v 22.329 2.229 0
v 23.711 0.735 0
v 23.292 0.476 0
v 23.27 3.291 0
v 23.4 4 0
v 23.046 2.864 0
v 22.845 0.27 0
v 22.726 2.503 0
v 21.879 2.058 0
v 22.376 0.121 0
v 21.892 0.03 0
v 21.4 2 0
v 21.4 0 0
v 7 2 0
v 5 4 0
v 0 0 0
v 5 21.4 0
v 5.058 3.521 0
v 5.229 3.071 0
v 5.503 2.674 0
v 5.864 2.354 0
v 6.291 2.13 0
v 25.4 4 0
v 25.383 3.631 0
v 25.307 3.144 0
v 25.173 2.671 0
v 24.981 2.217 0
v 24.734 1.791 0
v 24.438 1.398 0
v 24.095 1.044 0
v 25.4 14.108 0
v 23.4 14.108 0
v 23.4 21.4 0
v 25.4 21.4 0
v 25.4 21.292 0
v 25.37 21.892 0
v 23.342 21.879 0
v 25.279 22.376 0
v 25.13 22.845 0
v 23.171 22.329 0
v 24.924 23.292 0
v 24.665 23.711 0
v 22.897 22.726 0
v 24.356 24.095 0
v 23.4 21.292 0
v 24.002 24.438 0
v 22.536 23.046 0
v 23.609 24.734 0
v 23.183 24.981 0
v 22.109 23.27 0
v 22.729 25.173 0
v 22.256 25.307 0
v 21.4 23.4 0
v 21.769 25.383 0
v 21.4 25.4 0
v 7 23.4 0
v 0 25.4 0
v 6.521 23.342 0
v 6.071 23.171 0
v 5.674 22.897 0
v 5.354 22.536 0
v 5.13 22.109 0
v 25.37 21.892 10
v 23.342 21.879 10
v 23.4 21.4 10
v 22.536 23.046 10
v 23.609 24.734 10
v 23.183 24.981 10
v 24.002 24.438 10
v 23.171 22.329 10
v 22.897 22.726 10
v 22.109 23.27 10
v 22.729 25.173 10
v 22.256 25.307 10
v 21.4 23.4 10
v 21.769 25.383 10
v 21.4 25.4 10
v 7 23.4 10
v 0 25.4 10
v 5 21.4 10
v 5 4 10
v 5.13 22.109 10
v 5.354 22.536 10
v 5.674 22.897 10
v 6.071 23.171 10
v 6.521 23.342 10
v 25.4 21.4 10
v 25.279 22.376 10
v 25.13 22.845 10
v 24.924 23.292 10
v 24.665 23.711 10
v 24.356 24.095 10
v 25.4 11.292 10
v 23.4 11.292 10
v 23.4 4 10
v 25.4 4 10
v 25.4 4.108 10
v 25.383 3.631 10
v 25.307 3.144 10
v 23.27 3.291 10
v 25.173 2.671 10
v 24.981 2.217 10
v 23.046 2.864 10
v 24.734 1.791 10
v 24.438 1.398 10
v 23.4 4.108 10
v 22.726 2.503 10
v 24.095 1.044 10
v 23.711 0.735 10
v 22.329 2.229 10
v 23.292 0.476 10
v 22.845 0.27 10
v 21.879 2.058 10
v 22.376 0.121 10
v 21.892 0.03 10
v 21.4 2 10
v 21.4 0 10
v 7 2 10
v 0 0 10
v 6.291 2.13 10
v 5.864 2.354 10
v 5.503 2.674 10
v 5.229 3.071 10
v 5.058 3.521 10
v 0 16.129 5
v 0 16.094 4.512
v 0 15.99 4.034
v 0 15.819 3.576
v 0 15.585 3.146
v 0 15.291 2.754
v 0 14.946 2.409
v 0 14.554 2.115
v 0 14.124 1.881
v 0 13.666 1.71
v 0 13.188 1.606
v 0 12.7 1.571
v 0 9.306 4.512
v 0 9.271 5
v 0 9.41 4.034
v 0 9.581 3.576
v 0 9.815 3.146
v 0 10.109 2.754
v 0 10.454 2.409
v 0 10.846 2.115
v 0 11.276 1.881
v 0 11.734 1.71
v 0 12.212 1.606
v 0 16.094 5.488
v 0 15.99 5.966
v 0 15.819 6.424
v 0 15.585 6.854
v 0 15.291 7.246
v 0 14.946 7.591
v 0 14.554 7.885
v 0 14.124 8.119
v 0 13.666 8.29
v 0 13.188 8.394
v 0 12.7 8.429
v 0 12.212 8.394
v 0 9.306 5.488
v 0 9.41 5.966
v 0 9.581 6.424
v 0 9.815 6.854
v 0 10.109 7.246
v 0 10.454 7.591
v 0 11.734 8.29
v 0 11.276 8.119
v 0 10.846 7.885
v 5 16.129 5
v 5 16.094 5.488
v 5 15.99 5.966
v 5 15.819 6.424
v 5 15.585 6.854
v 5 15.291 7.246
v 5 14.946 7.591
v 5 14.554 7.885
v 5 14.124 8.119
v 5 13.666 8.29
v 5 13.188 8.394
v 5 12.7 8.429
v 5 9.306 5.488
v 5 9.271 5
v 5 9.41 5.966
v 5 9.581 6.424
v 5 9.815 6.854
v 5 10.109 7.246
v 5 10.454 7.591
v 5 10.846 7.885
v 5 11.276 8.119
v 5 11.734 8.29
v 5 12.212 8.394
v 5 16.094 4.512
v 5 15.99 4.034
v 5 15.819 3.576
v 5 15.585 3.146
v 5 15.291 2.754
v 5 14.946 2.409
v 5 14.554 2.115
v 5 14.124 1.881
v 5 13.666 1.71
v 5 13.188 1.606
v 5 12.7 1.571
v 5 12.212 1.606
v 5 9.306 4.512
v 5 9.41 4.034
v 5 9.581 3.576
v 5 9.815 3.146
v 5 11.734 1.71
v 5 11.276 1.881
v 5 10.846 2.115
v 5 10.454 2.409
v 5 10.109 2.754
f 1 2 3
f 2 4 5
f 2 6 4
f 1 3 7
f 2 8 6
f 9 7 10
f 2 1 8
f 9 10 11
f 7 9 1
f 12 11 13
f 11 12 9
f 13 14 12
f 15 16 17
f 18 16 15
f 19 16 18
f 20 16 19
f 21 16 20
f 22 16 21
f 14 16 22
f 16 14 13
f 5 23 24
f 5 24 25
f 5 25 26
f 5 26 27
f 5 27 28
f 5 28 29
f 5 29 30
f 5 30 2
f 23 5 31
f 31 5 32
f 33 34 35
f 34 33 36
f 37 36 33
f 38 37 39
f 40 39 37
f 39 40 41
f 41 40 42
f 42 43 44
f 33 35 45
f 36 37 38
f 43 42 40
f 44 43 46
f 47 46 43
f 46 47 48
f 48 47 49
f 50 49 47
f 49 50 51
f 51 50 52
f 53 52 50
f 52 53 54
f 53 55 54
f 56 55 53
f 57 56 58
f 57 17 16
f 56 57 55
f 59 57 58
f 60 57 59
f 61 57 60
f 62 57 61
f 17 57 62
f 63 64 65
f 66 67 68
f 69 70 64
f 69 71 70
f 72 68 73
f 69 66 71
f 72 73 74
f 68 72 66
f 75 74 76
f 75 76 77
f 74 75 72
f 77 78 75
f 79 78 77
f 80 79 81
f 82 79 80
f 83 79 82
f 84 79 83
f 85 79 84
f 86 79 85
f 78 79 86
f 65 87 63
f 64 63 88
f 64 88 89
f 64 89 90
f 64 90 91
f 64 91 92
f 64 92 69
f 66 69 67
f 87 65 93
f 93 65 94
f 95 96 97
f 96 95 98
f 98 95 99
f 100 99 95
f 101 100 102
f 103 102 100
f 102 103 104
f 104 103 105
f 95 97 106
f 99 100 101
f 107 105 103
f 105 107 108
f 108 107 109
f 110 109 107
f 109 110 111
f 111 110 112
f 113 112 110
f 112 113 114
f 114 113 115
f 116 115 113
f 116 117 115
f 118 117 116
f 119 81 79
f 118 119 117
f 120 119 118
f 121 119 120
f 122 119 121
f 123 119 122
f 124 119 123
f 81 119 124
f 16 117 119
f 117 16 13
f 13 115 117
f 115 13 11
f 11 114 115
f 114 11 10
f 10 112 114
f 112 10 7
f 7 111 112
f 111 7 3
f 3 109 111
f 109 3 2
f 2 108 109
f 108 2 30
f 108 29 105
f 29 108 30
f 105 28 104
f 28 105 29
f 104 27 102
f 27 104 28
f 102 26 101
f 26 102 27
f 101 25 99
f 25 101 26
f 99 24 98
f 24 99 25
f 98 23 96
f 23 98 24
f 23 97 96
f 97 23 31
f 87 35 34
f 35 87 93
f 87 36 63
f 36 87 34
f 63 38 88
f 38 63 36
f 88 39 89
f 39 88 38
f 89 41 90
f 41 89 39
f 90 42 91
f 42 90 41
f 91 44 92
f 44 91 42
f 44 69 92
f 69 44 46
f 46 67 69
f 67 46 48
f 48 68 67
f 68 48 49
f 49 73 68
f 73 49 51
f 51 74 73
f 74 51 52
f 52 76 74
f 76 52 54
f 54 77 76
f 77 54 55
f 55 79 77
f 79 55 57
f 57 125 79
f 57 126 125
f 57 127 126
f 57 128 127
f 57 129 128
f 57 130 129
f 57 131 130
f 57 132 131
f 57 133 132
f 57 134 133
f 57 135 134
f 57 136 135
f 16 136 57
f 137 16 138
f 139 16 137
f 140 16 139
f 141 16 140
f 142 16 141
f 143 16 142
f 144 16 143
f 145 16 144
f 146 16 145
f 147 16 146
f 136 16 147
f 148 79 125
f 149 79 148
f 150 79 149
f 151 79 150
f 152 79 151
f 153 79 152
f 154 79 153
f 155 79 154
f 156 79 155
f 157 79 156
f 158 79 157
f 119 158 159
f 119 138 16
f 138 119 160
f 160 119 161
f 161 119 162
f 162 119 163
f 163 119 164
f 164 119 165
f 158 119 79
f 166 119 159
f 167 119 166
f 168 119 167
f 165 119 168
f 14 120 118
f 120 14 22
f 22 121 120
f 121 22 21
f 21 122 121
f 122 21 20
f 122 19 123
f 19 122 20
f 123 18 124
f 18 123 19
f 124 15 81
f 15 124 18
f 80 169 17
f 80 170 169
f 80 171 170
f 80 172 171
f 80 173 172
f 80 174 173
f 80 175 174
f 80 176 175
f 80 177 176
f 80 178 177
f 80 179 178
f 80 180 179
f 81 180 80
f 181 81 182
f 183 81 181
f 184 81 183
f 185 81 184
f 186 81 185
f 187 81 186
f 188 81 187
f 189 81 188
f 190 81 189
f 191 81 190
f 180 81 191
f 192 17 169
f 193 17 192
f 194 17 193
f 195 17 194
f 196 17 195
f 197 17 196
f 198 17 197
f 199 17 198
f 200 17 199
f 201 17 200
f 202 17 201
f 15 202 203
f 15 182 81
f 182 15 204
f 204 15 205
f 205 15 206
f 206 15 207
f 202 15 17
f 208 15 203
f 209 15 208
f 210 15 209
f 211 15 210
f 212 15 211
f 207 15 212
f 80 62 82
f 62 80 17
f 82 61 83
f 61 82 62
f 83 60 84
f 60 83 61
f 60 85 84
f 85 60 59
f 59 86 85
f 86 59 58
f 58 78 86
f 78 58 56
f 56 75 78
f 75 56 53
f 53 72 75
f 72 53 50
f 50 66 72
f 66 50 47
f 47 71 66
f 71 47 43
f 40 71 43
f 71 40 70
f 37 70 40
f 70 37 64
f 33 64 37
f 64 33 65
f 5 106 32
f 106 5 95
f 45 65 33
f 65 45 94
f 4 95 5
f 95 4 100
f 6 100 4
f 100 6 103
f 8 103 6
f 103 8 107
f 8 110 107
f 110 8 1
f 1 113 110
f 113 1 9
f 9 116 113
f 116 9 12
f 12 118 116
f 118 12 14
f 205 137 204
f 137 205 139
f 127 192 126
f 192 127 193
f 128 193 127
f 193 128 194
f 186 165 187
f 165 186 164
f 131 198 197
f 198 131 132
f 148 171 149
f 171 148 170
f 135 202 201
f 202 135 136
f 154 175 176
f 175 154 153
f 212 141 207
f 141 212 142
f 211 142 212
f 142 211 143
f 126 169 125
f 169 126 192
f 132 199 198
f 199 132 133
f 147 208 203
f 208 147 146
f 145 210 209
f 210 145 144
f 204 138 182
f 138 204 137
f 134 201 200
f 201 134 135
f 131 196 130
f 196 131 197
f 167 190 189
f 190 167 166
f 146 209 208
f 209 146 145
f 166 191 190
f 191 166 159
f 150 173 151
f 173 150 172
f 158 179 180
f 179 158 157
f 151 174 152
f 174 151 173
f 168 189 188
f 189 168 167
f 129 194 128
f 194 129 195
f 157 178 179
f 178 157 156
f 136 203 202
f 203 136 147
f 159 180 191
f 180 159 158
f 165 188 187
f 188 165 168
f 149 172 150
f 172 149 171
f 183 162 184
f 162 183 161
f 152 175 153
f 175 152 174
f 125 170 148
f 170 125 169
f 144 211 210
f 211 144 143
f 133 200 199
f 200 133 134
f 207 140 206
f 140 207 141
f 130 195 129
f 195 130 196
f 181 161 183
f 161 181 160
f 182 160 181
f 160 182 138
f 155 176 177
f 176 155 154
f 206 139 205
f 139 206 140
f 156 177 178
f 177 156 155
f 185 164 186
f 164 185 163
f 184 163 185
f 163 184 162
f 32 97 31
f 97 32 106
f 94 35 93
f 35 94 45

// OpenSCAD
$fs = 0.5;
$fa = 1;
mm = 1;
inch = 25.4 * mm;

back_thickness = 5 * mm;
clip_thickness = 2 * mm;
width = 10 * mm;
depth = 1 * inch;
height = 1 * inch;

opening_width = 0.2 * inch;

hole_dia = 0.27 * inch;

module cable_interior_base()
{
    translate([back_thickness, clip_thickness])
    square([
        depth - clip_thickness - back_thickness,
        height - 2 * clip_thickness,
    ]);
}

module cable_interior()
{
    offset(r = clip_thickness) offset(delta = -clip_thickness) cable_interior_base();
}

module cable_exterior()
{
    offset(r = 2 * clip_thickness) offset(delta = -clip_thickness) cable_interior_base();
}

module clip_profile()
{
    square([back_thickness, height]);
    square([back_thickness + 2 * clip_thickness, clip_thickness]);
    translate([0, height - clip_thickness])
        square([back_thickness + 2 * clip_thickness, clip_thickness]);
    difference() {
        cable_exterior();
        cable_interior();
    }
}

module shelf_pin()
{
    difference()
    {
        linear_extrude(height = width, convexity = 2) clip_profile();
        translate([ -0.1, height / 2, width / 2 ]) rotate([ 0, 90, 0 ])
            cylinder(d = hole_dia, h = back_thickness + 0.2);
        translate([depth - clip_thickness / 2, height/2, width/2]) rotate([45, 0, 0]) cube([clip_thickness + 0.2, opening_width, 3 * width], center=true);
    }
}

shelf_pin();
